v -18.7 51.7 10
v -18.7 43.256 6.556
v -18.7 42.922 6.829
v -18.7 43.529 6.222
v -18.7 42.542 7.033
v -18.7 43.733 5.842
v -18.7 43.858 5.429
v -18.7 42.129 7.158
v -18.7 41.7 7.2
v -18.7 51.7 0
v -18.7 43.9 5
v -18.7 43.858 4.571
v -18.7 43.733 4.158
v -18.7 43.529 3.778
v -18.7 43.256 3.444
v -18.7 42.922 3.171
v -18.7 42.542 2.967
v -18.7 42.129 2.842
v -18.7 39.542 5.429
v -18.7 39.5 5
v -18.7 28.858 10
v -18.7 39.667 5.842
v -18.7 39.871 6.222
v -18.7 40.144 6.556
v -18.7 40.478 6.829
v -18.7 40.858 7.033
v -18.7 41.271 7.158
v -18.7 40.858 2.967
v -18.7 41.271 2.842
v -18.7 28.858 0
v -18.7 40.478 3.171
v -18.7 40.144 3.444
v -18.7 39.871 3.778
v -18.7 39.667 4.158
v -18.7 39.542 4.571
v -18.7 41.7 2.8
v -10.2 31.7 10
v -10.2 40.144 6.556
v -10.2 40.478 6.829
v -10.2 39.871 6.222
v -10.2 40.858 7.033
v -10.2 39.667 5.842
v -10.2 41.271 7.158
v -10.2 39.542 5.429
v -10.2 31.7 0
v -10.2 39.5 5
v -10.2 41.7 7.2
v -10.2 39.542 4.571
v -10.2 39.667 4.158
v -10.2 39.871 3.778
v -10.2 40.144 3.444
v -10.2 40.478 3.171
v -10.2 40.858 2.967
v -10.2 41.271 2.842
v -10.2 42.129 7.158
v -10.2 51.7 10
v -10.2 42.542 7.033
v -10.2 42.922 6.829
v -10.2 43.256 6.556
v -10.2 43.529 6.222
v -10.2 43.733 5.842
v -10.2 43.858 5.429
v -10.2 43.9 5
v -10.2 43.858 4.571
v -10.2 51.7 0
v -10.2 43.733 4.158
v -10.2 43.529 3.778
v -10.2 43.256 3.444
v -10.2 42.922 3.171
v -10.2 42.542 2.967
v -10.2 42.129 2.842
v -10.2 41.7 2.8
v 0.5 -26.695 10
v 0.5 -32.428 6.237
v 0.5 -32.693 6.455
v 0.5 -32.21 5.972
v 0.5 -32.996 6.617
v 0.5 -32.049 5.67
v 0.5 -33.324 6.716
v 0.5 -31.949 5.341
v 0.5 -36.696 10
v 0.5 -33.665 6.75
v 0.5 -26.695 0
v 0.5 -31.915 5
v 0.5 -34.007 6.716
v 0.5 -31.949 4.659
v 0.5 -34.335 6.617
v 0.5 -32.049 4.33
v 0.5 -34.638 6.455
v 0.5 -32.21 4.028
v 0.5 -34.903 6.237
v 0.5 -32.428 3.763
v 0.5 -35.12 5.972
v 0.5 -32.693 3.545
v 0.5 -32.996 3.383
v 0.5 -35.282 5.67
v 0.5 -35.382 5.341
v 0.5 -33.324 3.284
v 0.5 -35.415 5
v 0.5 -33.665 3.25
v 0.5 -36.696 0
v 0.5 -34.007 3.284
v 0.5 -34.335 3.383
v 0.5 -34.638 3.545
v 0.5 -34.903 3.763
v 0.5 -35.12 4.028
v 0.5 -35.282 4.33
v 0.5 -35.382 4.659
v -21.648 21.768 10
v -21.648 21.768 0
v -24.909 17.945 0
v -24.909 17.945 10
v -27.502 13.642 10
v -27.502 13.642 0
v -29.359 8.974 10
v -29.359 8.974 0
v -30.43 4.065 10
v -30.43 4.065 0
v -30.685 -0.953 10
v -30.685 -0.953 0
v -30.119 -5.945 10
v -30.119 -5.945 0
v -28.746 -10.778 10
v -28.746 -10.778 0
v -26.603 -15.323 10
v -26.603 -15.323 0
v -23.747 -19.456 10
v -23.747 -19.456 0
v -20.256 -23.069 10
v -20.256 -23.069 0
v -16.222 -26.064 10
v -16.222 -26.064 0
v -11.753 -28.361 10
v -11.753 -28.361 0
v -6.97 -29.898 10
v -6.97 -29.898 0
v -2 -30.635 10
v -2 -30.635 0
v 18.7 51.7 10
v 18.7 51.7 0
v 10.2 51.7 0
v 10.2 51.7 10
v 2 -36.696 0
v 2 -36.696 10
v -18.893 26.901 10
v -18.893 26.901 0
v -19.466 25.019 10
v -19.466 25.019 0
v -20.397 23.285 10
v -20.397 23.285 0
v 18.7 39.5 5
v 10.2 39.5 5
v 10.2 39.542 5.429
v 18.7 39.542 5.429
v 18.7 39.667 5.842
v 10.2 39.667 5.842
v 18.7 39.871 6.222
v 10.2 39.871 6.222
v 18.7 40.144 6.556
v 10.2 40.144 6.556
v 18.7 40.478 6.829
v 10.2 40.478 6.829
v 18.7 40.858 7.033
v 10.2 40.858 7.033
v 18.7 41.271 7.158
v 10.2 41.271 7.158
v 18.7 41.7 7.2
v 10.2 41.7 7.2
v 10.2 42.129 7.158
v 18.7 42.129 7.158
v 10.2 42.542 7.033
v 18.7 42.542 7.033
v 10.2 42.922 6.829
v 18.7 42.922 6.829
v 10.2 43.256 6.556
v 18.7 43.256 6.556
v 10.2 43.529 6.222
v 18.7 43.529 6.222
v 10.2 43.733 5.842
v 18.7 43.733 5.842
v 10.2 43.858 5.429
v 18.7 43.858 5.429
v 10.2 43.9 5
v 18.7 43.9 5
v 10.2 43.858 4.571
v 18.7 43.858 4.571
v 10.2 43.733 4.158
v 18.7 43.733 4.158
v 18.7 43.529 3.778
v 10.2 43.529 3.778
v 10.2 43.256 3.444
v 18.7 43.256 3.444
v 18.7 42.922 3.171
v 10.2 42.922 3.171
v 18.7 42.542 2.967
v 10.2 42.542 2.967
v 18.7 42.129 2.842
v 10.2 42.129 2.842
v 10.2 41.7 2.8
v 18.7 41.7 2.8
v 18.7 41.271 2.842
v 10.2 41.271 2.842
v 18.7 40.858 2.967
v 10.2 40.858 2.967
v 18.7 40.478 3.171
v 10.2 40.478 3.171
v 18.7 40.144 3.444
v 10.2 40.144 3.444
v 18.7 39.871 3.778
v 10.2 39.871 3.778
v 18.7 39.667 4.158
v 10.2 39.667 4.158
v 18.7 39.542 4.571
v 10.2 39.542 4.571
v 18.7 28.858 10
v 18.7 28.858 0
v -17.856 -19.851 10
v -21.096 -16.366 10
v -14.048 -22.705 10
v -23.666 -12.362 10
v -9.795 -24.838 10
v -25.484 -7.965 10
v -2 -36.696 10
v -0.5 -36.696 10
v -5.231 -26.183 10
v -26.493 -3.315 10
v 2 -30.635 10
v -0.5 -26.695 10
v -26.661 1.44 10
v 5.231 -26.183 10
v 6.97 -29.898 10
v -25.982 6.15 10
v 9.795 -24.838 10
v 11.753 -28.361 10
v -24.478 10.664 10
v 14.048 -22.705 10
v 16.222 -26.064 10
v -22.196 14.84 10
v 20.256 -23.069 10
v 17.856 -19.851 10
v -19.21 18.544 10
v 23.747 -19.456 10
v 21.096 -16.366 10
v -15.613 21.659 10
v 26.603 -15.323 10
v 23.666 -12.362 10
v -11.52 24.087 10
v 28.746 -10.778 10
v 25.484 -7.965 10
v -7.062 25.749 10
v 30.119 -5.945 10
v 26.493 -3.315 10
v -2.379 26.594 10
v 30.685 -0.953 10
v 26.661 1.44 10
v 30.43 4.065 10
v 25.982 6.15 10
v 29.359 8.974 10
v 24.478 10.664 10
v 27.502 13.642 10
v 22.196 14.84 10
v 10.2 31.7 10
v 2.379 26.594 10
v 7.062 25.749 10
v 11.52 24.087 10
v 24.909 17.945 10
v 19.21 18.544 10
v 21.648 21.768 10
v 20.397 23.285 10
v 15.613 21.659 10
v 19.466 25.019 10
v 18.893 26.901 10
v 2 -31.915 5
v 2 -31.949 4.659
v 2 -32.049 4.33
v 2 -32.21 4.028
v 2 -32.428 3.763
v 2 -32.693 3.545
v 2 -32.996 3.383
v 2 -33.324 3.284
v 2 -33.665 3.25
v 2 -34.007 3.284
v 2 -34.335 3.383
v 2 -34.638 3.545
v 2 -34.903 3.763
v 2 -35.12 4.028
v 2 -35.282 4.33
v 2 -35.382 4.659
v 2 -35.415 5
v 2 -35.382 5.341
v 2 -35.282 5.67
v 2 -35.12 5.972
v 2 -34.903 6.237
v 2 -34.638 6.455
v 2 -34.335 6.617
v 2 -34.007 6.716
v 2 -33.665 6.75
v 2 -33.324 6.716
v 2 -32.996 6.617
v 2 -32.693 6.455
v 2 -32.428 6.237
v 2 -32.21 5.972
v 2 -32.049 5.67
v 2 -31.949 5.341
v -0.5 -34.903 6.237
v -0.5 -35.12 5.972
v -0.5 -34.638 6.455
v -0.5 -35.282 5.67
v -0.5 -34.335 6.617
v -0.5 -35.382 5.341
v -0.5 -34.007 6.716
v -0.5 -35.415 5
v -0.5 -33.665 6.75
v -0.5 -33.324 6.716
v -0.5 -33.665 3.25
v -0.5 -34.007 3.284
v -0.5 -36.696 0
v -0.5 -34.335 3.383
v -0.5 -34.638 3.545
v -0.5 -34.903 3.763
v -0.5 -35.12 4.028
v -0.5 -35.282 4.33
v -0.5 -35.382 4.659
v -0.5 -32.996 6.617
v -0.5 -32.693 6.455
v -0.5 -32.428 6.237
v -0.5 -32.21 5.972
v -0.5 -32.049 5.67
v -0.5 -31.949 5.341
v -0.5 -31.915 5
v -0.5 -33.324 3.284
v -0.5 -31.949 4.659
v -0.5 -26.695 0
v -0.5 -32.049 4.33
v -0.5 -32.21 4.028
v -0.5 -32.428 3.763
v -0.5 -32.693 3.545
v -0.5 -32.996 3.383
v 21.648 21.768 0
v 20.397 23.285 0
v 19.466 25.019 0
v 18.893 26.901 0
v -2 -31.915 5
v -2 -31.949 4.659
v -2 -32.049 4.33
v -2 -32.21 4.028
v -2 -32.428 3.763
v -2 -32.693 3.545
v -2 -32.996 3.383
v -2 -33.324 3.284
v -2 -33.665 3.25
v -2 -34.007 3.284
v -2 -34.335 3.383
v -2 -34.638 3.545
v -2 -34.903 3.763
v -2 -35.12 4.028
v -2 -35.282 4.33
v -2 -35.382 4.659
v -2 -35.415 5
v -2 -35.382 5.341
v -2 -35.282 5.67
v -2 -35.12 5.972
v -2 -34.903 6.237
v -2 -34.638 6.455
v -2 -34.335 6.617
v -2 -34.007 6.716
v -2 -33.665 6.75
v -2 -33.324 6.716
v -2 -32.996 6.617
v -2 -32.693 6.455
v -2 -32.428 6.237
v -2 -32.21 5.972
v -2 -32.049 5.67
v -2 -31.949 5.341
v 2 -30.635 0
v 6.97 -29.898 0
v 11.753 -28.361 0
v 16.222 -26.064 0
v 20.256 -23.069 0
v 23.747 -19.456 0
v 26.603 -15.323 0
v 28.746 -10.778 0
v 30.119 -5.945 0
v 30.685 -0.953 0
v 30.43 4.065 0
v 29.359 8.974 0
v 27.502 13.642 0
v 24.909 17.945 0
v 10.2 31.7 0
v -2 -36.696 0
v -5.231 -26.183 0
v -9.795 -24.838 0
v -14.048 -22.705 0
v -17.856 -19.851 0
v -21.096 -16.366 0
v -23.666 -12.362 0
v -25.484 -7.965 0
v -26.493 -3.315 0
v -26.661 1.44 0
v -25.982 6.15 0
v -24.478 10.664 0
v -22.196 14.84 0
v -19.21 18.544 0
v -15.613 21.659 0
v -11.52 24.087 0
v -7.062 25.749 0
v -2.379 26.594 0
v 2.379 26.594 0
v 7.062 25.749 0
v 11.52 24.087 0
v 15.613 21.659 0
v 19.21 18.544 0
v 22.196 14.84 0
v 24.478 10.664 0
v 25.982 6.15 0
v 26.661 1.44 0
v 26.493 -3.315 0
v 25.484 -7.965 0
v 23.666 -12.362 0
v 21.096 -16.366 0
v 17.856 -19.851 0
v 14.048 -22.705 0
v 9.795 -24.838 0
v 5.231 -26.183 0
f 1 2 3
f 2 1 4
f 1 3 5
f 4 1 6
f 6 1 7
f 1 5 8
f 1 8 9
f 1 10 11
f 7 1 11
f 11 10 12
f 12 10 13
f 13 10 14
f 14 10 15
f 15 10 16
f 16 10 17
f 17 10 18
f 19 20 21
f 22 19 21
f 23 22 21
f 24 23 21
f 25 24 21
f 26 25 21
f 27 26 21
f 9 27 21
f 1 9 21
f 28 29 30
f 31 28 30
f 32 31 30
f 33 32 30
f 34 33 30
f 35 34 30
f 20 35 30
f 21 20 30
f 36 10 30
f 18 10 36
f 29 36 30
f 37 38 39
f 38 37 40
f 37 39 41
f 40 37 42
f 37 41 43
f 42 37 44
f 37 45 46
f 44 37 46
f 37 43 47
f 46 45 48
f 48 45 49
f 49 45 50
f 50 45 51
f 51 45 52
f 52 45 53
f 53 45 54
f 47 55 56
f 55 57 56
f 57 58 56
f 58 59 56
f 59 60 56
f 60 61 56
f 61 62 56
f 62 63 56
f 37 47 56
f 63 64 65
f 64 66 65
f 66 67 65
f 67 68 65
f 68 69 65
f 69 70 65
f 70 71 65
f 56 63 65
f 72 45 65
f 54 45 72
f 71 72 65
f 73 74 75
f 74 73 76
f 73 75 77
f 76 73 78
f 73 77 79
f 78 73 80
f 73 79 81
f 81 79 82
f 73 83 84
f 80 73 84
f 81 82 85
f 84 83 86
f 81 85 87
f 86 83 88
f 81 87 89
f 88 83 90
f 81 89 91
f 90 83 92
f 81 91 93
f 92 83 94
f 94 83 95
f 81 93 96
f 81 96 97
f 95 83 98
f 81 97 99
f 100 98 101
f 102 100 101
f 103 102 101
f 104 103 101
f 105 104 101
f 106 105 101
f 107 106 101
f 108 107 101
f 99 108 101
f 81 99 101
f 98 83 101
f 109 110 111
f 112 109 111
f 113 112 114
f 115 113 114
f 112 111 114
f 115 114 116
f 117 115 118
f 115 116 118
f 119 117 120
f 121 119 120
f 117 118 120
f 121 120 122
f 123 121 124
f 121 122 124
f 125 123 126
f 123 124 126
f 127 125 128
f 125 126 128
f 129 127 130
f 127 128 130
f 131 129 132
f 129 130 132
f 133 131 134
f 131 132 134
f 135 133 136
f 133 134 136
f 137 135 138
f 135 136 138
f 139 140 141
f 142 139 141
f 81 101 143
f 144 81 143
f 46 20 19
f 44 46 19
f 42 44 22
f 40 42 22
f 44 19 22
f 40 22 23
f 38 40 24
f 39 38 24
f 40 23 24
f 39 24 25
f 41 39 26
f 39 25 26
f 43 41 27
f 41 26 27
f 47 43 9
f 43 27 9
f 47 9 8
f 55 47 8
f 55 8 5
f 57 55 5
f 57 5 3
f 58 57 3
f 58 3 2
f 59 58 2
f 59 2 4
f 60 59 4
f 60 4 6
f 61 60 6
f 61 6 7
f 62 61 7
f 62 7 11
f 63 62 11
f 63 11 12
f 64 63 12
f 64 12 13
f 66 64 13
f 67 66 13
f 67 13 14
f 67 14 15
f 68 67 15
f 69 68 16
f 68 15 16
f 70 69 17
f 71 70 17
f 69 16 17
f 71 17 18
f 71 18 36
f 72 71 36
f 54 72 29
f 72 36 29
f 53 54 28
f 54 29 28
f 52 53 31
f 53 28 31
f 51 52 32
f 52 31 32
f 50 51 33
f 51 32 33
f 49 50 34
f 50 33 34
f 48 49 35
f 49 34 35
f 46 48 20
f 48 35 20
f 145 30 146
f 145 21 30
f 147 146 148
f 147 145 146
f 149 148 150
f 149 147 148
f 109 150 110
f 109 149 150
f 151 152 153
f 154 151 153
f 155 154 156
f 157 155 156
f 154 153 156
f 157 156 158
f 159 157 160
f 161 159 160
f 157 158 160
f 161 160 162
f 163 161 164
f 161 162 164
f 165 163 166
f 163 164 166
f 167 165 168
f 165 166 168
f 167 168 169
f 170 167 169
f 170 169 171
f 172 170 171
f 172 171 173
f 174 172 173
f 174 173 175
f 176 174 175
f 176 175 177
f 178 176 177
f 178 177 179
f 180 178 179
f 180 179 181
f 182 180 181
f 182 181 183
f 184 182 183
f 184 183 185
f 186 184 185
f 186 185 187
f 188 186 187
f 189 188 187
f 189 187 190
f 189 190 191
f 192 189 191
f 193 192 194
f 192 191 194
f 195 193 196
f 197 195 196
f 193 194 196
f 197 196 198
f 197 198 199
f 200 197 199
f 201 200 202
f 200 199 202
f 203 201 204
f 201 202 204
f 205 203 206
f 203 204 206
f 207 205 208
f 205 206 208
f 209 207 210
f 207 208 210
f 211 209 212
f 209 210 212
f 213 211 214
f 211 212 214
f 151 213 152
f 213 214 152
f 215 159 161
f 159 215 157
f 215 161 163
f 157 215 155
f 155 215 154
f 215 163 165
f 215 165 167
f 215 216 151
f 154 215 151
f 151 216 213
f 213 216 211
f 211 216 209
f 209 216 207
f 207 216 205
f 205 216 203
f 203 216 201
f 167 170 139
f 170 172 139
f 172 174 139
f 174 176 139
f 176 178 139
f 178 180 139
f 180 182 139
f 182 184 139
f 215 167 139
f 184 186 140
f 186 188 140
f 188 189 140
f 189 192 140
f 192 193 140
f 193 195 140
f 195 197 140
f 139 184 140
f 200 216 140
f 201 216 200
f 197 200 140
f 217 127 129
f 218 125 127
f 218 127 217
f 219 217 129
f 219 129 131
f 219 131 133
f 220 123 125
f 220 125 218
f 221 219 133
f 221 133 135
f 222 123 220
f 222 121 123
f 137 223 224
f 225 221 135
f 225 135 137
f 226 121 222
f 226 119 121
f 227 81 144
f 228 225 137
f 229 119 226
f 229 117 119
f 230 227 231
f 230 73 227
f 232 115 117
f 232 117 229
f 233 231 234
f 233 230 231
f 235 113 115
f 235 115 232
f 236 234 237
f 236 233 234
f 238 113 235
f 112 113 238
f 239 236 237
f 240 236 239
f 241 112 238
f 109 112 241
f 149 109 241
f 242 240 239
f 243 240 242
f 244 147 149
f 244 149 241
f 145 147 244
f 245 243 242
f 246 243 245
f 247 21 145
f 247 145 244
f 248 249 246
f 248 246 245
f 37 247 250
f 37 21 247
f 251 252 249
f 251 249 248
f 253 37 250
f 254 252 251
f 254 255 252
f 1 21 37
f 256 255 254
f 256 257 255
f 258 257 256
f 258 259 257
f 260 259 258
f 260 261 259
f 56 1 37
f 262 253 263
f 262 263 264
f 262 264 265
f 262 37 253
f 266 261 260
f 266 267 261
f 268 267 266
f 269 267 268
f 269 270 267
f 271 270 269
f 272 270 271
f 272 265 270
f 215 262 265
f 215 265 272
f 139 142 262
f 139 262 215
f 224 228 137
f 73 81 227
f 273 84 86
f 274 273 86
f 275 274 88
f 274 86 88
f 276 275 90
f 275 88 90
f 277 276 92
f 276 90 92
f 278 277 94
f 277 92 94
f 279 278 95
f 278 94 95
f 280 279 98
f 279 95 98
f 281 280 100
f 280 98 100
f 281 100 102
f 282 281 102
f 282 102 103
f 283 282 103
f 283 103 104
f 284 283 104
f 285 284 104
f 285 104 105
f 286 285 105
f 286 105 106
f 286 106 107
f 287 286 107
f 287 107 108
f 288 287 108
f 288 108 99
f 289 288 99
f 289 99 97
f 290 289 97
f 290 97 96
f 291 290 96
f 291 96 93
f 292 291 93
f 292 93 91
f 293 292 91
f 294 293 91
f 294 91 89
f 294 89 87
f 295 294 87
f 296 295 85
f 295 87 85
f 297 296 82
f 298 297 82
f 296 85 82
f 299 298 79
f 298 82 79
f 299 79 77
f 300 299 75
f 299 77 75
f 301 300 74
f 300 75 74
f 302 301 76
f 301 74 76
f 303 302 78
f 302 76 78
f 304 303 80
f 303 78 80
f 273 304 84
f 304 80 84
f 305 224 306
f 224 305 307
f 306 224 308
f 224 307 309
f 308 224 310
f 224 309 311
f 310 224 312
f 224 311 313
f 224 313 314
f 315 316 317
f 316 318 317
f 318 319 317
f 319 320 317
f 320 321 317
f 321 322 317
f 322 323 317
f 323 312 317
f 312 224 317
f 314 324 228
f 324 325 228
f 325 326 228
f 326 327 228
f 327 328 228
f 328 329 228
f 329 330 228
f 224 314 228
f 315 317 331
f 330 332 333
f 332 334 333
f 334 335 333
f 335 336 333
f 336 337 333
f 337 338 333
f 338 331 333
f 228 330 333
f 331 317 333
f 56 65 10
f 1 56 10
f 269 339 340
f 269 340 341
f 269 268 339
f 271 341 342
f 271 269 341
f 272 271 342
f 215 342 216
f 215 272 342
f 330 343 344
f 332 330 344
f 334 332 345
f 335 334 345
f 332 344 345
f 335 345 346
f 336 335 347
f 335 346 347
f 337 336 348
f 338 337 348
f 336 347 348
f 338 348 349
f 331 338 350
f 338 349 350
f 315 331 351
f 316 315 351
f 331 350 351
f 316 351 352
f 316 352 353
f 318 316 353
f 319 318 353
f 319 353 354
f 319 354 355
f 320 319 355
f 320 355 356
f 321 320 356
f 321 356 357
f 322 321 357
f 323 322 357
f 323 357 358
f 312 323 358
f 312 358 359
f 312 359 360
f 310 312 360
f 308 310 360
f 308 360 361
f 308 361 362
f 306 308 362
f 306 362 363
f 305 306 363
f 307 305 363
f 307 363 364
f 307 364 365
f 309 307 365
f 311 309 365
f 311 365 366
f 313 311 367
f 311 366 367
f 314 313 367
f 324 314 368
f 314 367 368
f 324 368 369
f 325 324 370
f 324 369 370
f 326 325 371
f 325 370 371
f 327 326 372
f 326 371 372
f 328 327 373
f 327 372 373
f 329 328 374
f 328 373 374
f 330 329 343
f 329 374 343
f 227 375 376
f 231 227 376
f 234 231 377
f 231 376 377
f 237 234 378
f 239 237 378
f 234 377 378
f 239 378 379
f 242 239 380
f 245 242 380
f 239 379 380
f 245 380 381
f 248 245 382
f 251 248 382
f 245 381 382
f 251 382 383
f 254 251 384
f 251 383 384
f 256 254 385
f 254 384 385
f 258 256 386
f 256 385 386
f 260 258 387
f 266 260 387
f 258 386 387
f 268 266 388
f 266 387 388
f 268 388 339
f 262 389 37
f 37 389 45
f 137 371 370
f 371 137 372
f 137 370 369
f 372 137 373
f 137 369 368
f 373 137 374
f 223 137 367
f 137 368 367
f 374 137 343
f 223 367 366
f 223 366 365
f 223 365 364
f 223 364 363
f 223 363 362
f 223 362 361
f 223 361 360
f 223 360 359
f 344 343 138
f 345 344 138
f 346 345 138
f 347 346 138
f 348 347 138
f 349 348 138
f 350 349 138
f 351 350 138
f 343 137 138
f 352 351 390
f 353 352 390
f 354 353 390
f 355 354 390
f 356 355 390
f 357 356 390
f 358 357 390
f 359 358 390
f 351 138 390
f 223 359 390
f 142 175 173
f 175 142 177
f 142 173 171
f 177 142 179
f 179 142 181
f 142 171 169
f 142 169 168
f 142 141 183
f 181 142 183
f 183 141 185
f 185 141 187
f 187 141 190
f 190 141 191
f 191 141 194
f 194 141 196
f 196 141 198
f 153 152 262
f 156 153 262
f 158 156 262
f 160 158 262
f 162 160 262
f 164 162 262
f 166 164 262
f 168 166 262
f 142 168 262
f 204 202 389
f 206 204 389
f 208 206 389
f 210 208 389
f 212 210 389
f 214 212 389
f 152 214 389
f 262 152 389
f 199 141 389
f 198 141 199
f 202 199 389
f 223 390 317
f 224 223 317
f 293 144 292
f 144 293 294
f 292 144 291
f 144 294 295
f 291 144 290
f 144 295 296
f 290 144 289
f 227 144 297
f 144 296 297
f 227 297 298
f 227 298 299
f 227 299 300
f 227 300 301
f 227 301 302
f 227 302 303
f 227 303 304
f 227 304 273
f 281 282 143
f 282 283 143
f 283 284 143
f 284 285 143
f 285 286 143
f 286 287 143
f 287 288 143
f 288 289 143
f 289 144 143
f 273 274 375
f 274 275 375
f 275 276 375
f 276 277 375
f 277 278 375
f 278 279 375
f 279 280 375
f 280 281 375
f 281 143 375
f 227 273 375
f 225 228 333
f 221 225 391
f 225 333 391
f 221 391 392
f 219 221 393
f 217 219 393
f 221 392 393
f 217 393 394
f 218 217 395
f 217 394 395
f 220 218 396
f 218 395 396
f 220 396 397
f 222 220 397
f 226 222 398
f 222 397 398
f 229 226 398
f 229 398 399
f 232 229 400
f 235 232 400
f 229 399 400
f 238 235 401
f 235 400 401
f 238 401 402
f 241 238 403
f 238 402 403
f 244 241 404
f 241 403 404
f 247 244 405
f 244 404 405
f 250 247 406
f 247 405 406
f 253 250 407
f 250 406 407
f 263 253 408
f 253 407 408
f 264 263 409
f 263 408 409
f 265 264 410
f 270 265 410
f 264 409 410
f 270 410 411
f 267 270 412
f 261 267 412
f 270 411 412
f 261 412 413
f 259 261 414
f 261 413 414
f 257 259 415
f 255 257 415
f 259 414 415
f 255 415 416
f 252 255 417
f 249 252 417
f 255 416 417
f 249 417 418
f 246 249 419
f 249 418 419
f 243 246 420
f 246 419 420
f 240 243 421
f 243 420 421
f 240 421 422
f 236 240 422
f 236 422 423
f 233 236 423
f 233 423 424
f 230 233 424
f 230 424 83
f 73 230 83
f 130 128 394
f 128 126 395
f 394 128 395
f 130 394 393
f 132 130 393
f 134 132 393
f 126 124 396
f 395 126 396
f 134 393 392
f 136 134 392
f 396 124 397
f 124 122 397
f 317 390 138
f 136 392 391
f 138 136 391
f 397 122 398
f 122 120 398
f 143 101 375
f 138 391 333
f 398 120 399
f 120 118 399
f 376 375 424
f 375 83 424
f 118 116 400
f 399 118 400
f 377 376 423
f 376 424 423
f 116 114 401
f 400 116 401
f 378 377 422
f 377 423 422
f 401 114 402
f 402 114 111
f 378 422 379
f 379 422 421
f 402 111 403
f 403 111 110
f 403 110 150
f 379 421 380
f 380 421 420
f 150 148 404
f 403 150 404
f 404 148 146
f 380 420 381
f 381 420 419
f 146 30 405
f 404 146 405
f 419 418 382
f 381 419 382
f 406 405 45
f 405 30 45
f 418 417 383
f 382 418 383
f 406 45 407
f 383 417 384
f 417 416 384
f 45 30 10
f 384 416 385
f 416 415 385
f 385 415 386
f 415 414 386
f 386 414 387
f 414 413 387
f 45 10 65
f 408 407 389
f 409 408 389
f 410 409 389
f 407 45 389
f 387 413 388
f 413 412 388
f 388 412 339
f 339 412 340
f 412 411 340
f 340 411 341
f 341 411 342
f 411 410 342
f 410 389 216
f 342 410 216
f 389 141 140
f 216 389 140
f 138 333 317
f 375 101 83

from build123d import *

# Parameters (mm, degrees)
AUFSATZ_LINEAR_AUSTRAGEN1_DEPTH = 10
SKIZZE2_R                       = 1.75
SCHNITT_LINEAR_AUSTRAGEN1_DEPTH = 62.985320843
SKIZZE4_R                       = 2.2
SCHNITT_LINEAR_AUSTRAGEN3_DEPTH = 73.202839279
VERRUNDUNG1_R                   = 10


with BuildPart() as part:
    # Skizze1 → Aufsatz-Linear austragen1 (new body)
    with BuildSketch(Plane.XY):
        with BuildLine():
            Line((0.5, -26.695317942), (0.5, -30.695928069))
            Line((0.5, -30.695928069), (0.5, -36.695928069))
            Line((0.5, -36.695928069), (2, -36.695928069))
            Line((2, -36.695928069), (2, -30.634784151))
            ThreePointArc((2, -30.634784151), (29.374903671, -8.922165338), (18.7, 24.34748447))
            Line((18.7, 24.34748447), (18.7, 51.7))
            Line((18.7, 51.7), (10.2, 51.7))
            Line((10.2, 51.7), (10.2, 31.7))
            Line((10.2, 31.7), (-10.2, 31.7))
            Line((-10.2, 31.7), (-10.2, 51.7))
            Line((-10.2, 51.7), (-18.7, 51.7))
            Line((-18.7, 51.7), (-18.7, 24.34748447))
            ThreePointArc((-18.7, 24.34748447), (-29.374903671, -8.922165338), (-2, -30.634784151))
            Line((-2, -30.634784151), (-2, -36.695928069))
            Line((-2, -36.695928069), (-0.5, -36.695928069))
            Line((-0.5, -36.695928069), (-0.5, -30.695928069))
            Line((-0.5, -30.695928069), (-0.5, -26.695317942))
            ThreePointArc((-0.5, -26.695317942), (0, 26.7), (0.5, -26.695317942))
        make_face()
    extrude(amount=AUFSATZ_LINEAR_AUSTRAGEN1_DEPTH)

    # Skizze2 → Schnitt-Linear austragen1 (cut, through all)
    with BuildSketch(Plane.ZY.offset(2)):
        with Locations(Location((5, -33.66535611, 0), (0, 0, 90))):
            Circle(SKIZZE2_R)
    extrude(amount=-SCHNITT_LINEAR_AUSTRAGEN1_DEPTH, mode=Mode.SUBTRACT)

    # Skizze4 → Schnitt-Linear austragen3 (cut, through all)
    with BuildSketch(Plane.ZY.offset(18.7)):
        with Locations(Location((5, 41.7, 0), (0, 0, 270))):
            Circle(SKIZZE4_R)
    extrude(amount=-SCHNITT_LINEAR_AUSTRAGEN3_DEPTH, mode=Mode.SUBTRACT)

    # Verrundung1
    verrundung1_edges = [part.edges().sort_by_distance(p)[0] for p in [
        (-18.7, 24.34748447, 5),
        (18.7, 24.34748447, 5),
    ]]
    fillet(verrundung1_edges, radius=VERRUNDUNG1_R)


solid = part.part
